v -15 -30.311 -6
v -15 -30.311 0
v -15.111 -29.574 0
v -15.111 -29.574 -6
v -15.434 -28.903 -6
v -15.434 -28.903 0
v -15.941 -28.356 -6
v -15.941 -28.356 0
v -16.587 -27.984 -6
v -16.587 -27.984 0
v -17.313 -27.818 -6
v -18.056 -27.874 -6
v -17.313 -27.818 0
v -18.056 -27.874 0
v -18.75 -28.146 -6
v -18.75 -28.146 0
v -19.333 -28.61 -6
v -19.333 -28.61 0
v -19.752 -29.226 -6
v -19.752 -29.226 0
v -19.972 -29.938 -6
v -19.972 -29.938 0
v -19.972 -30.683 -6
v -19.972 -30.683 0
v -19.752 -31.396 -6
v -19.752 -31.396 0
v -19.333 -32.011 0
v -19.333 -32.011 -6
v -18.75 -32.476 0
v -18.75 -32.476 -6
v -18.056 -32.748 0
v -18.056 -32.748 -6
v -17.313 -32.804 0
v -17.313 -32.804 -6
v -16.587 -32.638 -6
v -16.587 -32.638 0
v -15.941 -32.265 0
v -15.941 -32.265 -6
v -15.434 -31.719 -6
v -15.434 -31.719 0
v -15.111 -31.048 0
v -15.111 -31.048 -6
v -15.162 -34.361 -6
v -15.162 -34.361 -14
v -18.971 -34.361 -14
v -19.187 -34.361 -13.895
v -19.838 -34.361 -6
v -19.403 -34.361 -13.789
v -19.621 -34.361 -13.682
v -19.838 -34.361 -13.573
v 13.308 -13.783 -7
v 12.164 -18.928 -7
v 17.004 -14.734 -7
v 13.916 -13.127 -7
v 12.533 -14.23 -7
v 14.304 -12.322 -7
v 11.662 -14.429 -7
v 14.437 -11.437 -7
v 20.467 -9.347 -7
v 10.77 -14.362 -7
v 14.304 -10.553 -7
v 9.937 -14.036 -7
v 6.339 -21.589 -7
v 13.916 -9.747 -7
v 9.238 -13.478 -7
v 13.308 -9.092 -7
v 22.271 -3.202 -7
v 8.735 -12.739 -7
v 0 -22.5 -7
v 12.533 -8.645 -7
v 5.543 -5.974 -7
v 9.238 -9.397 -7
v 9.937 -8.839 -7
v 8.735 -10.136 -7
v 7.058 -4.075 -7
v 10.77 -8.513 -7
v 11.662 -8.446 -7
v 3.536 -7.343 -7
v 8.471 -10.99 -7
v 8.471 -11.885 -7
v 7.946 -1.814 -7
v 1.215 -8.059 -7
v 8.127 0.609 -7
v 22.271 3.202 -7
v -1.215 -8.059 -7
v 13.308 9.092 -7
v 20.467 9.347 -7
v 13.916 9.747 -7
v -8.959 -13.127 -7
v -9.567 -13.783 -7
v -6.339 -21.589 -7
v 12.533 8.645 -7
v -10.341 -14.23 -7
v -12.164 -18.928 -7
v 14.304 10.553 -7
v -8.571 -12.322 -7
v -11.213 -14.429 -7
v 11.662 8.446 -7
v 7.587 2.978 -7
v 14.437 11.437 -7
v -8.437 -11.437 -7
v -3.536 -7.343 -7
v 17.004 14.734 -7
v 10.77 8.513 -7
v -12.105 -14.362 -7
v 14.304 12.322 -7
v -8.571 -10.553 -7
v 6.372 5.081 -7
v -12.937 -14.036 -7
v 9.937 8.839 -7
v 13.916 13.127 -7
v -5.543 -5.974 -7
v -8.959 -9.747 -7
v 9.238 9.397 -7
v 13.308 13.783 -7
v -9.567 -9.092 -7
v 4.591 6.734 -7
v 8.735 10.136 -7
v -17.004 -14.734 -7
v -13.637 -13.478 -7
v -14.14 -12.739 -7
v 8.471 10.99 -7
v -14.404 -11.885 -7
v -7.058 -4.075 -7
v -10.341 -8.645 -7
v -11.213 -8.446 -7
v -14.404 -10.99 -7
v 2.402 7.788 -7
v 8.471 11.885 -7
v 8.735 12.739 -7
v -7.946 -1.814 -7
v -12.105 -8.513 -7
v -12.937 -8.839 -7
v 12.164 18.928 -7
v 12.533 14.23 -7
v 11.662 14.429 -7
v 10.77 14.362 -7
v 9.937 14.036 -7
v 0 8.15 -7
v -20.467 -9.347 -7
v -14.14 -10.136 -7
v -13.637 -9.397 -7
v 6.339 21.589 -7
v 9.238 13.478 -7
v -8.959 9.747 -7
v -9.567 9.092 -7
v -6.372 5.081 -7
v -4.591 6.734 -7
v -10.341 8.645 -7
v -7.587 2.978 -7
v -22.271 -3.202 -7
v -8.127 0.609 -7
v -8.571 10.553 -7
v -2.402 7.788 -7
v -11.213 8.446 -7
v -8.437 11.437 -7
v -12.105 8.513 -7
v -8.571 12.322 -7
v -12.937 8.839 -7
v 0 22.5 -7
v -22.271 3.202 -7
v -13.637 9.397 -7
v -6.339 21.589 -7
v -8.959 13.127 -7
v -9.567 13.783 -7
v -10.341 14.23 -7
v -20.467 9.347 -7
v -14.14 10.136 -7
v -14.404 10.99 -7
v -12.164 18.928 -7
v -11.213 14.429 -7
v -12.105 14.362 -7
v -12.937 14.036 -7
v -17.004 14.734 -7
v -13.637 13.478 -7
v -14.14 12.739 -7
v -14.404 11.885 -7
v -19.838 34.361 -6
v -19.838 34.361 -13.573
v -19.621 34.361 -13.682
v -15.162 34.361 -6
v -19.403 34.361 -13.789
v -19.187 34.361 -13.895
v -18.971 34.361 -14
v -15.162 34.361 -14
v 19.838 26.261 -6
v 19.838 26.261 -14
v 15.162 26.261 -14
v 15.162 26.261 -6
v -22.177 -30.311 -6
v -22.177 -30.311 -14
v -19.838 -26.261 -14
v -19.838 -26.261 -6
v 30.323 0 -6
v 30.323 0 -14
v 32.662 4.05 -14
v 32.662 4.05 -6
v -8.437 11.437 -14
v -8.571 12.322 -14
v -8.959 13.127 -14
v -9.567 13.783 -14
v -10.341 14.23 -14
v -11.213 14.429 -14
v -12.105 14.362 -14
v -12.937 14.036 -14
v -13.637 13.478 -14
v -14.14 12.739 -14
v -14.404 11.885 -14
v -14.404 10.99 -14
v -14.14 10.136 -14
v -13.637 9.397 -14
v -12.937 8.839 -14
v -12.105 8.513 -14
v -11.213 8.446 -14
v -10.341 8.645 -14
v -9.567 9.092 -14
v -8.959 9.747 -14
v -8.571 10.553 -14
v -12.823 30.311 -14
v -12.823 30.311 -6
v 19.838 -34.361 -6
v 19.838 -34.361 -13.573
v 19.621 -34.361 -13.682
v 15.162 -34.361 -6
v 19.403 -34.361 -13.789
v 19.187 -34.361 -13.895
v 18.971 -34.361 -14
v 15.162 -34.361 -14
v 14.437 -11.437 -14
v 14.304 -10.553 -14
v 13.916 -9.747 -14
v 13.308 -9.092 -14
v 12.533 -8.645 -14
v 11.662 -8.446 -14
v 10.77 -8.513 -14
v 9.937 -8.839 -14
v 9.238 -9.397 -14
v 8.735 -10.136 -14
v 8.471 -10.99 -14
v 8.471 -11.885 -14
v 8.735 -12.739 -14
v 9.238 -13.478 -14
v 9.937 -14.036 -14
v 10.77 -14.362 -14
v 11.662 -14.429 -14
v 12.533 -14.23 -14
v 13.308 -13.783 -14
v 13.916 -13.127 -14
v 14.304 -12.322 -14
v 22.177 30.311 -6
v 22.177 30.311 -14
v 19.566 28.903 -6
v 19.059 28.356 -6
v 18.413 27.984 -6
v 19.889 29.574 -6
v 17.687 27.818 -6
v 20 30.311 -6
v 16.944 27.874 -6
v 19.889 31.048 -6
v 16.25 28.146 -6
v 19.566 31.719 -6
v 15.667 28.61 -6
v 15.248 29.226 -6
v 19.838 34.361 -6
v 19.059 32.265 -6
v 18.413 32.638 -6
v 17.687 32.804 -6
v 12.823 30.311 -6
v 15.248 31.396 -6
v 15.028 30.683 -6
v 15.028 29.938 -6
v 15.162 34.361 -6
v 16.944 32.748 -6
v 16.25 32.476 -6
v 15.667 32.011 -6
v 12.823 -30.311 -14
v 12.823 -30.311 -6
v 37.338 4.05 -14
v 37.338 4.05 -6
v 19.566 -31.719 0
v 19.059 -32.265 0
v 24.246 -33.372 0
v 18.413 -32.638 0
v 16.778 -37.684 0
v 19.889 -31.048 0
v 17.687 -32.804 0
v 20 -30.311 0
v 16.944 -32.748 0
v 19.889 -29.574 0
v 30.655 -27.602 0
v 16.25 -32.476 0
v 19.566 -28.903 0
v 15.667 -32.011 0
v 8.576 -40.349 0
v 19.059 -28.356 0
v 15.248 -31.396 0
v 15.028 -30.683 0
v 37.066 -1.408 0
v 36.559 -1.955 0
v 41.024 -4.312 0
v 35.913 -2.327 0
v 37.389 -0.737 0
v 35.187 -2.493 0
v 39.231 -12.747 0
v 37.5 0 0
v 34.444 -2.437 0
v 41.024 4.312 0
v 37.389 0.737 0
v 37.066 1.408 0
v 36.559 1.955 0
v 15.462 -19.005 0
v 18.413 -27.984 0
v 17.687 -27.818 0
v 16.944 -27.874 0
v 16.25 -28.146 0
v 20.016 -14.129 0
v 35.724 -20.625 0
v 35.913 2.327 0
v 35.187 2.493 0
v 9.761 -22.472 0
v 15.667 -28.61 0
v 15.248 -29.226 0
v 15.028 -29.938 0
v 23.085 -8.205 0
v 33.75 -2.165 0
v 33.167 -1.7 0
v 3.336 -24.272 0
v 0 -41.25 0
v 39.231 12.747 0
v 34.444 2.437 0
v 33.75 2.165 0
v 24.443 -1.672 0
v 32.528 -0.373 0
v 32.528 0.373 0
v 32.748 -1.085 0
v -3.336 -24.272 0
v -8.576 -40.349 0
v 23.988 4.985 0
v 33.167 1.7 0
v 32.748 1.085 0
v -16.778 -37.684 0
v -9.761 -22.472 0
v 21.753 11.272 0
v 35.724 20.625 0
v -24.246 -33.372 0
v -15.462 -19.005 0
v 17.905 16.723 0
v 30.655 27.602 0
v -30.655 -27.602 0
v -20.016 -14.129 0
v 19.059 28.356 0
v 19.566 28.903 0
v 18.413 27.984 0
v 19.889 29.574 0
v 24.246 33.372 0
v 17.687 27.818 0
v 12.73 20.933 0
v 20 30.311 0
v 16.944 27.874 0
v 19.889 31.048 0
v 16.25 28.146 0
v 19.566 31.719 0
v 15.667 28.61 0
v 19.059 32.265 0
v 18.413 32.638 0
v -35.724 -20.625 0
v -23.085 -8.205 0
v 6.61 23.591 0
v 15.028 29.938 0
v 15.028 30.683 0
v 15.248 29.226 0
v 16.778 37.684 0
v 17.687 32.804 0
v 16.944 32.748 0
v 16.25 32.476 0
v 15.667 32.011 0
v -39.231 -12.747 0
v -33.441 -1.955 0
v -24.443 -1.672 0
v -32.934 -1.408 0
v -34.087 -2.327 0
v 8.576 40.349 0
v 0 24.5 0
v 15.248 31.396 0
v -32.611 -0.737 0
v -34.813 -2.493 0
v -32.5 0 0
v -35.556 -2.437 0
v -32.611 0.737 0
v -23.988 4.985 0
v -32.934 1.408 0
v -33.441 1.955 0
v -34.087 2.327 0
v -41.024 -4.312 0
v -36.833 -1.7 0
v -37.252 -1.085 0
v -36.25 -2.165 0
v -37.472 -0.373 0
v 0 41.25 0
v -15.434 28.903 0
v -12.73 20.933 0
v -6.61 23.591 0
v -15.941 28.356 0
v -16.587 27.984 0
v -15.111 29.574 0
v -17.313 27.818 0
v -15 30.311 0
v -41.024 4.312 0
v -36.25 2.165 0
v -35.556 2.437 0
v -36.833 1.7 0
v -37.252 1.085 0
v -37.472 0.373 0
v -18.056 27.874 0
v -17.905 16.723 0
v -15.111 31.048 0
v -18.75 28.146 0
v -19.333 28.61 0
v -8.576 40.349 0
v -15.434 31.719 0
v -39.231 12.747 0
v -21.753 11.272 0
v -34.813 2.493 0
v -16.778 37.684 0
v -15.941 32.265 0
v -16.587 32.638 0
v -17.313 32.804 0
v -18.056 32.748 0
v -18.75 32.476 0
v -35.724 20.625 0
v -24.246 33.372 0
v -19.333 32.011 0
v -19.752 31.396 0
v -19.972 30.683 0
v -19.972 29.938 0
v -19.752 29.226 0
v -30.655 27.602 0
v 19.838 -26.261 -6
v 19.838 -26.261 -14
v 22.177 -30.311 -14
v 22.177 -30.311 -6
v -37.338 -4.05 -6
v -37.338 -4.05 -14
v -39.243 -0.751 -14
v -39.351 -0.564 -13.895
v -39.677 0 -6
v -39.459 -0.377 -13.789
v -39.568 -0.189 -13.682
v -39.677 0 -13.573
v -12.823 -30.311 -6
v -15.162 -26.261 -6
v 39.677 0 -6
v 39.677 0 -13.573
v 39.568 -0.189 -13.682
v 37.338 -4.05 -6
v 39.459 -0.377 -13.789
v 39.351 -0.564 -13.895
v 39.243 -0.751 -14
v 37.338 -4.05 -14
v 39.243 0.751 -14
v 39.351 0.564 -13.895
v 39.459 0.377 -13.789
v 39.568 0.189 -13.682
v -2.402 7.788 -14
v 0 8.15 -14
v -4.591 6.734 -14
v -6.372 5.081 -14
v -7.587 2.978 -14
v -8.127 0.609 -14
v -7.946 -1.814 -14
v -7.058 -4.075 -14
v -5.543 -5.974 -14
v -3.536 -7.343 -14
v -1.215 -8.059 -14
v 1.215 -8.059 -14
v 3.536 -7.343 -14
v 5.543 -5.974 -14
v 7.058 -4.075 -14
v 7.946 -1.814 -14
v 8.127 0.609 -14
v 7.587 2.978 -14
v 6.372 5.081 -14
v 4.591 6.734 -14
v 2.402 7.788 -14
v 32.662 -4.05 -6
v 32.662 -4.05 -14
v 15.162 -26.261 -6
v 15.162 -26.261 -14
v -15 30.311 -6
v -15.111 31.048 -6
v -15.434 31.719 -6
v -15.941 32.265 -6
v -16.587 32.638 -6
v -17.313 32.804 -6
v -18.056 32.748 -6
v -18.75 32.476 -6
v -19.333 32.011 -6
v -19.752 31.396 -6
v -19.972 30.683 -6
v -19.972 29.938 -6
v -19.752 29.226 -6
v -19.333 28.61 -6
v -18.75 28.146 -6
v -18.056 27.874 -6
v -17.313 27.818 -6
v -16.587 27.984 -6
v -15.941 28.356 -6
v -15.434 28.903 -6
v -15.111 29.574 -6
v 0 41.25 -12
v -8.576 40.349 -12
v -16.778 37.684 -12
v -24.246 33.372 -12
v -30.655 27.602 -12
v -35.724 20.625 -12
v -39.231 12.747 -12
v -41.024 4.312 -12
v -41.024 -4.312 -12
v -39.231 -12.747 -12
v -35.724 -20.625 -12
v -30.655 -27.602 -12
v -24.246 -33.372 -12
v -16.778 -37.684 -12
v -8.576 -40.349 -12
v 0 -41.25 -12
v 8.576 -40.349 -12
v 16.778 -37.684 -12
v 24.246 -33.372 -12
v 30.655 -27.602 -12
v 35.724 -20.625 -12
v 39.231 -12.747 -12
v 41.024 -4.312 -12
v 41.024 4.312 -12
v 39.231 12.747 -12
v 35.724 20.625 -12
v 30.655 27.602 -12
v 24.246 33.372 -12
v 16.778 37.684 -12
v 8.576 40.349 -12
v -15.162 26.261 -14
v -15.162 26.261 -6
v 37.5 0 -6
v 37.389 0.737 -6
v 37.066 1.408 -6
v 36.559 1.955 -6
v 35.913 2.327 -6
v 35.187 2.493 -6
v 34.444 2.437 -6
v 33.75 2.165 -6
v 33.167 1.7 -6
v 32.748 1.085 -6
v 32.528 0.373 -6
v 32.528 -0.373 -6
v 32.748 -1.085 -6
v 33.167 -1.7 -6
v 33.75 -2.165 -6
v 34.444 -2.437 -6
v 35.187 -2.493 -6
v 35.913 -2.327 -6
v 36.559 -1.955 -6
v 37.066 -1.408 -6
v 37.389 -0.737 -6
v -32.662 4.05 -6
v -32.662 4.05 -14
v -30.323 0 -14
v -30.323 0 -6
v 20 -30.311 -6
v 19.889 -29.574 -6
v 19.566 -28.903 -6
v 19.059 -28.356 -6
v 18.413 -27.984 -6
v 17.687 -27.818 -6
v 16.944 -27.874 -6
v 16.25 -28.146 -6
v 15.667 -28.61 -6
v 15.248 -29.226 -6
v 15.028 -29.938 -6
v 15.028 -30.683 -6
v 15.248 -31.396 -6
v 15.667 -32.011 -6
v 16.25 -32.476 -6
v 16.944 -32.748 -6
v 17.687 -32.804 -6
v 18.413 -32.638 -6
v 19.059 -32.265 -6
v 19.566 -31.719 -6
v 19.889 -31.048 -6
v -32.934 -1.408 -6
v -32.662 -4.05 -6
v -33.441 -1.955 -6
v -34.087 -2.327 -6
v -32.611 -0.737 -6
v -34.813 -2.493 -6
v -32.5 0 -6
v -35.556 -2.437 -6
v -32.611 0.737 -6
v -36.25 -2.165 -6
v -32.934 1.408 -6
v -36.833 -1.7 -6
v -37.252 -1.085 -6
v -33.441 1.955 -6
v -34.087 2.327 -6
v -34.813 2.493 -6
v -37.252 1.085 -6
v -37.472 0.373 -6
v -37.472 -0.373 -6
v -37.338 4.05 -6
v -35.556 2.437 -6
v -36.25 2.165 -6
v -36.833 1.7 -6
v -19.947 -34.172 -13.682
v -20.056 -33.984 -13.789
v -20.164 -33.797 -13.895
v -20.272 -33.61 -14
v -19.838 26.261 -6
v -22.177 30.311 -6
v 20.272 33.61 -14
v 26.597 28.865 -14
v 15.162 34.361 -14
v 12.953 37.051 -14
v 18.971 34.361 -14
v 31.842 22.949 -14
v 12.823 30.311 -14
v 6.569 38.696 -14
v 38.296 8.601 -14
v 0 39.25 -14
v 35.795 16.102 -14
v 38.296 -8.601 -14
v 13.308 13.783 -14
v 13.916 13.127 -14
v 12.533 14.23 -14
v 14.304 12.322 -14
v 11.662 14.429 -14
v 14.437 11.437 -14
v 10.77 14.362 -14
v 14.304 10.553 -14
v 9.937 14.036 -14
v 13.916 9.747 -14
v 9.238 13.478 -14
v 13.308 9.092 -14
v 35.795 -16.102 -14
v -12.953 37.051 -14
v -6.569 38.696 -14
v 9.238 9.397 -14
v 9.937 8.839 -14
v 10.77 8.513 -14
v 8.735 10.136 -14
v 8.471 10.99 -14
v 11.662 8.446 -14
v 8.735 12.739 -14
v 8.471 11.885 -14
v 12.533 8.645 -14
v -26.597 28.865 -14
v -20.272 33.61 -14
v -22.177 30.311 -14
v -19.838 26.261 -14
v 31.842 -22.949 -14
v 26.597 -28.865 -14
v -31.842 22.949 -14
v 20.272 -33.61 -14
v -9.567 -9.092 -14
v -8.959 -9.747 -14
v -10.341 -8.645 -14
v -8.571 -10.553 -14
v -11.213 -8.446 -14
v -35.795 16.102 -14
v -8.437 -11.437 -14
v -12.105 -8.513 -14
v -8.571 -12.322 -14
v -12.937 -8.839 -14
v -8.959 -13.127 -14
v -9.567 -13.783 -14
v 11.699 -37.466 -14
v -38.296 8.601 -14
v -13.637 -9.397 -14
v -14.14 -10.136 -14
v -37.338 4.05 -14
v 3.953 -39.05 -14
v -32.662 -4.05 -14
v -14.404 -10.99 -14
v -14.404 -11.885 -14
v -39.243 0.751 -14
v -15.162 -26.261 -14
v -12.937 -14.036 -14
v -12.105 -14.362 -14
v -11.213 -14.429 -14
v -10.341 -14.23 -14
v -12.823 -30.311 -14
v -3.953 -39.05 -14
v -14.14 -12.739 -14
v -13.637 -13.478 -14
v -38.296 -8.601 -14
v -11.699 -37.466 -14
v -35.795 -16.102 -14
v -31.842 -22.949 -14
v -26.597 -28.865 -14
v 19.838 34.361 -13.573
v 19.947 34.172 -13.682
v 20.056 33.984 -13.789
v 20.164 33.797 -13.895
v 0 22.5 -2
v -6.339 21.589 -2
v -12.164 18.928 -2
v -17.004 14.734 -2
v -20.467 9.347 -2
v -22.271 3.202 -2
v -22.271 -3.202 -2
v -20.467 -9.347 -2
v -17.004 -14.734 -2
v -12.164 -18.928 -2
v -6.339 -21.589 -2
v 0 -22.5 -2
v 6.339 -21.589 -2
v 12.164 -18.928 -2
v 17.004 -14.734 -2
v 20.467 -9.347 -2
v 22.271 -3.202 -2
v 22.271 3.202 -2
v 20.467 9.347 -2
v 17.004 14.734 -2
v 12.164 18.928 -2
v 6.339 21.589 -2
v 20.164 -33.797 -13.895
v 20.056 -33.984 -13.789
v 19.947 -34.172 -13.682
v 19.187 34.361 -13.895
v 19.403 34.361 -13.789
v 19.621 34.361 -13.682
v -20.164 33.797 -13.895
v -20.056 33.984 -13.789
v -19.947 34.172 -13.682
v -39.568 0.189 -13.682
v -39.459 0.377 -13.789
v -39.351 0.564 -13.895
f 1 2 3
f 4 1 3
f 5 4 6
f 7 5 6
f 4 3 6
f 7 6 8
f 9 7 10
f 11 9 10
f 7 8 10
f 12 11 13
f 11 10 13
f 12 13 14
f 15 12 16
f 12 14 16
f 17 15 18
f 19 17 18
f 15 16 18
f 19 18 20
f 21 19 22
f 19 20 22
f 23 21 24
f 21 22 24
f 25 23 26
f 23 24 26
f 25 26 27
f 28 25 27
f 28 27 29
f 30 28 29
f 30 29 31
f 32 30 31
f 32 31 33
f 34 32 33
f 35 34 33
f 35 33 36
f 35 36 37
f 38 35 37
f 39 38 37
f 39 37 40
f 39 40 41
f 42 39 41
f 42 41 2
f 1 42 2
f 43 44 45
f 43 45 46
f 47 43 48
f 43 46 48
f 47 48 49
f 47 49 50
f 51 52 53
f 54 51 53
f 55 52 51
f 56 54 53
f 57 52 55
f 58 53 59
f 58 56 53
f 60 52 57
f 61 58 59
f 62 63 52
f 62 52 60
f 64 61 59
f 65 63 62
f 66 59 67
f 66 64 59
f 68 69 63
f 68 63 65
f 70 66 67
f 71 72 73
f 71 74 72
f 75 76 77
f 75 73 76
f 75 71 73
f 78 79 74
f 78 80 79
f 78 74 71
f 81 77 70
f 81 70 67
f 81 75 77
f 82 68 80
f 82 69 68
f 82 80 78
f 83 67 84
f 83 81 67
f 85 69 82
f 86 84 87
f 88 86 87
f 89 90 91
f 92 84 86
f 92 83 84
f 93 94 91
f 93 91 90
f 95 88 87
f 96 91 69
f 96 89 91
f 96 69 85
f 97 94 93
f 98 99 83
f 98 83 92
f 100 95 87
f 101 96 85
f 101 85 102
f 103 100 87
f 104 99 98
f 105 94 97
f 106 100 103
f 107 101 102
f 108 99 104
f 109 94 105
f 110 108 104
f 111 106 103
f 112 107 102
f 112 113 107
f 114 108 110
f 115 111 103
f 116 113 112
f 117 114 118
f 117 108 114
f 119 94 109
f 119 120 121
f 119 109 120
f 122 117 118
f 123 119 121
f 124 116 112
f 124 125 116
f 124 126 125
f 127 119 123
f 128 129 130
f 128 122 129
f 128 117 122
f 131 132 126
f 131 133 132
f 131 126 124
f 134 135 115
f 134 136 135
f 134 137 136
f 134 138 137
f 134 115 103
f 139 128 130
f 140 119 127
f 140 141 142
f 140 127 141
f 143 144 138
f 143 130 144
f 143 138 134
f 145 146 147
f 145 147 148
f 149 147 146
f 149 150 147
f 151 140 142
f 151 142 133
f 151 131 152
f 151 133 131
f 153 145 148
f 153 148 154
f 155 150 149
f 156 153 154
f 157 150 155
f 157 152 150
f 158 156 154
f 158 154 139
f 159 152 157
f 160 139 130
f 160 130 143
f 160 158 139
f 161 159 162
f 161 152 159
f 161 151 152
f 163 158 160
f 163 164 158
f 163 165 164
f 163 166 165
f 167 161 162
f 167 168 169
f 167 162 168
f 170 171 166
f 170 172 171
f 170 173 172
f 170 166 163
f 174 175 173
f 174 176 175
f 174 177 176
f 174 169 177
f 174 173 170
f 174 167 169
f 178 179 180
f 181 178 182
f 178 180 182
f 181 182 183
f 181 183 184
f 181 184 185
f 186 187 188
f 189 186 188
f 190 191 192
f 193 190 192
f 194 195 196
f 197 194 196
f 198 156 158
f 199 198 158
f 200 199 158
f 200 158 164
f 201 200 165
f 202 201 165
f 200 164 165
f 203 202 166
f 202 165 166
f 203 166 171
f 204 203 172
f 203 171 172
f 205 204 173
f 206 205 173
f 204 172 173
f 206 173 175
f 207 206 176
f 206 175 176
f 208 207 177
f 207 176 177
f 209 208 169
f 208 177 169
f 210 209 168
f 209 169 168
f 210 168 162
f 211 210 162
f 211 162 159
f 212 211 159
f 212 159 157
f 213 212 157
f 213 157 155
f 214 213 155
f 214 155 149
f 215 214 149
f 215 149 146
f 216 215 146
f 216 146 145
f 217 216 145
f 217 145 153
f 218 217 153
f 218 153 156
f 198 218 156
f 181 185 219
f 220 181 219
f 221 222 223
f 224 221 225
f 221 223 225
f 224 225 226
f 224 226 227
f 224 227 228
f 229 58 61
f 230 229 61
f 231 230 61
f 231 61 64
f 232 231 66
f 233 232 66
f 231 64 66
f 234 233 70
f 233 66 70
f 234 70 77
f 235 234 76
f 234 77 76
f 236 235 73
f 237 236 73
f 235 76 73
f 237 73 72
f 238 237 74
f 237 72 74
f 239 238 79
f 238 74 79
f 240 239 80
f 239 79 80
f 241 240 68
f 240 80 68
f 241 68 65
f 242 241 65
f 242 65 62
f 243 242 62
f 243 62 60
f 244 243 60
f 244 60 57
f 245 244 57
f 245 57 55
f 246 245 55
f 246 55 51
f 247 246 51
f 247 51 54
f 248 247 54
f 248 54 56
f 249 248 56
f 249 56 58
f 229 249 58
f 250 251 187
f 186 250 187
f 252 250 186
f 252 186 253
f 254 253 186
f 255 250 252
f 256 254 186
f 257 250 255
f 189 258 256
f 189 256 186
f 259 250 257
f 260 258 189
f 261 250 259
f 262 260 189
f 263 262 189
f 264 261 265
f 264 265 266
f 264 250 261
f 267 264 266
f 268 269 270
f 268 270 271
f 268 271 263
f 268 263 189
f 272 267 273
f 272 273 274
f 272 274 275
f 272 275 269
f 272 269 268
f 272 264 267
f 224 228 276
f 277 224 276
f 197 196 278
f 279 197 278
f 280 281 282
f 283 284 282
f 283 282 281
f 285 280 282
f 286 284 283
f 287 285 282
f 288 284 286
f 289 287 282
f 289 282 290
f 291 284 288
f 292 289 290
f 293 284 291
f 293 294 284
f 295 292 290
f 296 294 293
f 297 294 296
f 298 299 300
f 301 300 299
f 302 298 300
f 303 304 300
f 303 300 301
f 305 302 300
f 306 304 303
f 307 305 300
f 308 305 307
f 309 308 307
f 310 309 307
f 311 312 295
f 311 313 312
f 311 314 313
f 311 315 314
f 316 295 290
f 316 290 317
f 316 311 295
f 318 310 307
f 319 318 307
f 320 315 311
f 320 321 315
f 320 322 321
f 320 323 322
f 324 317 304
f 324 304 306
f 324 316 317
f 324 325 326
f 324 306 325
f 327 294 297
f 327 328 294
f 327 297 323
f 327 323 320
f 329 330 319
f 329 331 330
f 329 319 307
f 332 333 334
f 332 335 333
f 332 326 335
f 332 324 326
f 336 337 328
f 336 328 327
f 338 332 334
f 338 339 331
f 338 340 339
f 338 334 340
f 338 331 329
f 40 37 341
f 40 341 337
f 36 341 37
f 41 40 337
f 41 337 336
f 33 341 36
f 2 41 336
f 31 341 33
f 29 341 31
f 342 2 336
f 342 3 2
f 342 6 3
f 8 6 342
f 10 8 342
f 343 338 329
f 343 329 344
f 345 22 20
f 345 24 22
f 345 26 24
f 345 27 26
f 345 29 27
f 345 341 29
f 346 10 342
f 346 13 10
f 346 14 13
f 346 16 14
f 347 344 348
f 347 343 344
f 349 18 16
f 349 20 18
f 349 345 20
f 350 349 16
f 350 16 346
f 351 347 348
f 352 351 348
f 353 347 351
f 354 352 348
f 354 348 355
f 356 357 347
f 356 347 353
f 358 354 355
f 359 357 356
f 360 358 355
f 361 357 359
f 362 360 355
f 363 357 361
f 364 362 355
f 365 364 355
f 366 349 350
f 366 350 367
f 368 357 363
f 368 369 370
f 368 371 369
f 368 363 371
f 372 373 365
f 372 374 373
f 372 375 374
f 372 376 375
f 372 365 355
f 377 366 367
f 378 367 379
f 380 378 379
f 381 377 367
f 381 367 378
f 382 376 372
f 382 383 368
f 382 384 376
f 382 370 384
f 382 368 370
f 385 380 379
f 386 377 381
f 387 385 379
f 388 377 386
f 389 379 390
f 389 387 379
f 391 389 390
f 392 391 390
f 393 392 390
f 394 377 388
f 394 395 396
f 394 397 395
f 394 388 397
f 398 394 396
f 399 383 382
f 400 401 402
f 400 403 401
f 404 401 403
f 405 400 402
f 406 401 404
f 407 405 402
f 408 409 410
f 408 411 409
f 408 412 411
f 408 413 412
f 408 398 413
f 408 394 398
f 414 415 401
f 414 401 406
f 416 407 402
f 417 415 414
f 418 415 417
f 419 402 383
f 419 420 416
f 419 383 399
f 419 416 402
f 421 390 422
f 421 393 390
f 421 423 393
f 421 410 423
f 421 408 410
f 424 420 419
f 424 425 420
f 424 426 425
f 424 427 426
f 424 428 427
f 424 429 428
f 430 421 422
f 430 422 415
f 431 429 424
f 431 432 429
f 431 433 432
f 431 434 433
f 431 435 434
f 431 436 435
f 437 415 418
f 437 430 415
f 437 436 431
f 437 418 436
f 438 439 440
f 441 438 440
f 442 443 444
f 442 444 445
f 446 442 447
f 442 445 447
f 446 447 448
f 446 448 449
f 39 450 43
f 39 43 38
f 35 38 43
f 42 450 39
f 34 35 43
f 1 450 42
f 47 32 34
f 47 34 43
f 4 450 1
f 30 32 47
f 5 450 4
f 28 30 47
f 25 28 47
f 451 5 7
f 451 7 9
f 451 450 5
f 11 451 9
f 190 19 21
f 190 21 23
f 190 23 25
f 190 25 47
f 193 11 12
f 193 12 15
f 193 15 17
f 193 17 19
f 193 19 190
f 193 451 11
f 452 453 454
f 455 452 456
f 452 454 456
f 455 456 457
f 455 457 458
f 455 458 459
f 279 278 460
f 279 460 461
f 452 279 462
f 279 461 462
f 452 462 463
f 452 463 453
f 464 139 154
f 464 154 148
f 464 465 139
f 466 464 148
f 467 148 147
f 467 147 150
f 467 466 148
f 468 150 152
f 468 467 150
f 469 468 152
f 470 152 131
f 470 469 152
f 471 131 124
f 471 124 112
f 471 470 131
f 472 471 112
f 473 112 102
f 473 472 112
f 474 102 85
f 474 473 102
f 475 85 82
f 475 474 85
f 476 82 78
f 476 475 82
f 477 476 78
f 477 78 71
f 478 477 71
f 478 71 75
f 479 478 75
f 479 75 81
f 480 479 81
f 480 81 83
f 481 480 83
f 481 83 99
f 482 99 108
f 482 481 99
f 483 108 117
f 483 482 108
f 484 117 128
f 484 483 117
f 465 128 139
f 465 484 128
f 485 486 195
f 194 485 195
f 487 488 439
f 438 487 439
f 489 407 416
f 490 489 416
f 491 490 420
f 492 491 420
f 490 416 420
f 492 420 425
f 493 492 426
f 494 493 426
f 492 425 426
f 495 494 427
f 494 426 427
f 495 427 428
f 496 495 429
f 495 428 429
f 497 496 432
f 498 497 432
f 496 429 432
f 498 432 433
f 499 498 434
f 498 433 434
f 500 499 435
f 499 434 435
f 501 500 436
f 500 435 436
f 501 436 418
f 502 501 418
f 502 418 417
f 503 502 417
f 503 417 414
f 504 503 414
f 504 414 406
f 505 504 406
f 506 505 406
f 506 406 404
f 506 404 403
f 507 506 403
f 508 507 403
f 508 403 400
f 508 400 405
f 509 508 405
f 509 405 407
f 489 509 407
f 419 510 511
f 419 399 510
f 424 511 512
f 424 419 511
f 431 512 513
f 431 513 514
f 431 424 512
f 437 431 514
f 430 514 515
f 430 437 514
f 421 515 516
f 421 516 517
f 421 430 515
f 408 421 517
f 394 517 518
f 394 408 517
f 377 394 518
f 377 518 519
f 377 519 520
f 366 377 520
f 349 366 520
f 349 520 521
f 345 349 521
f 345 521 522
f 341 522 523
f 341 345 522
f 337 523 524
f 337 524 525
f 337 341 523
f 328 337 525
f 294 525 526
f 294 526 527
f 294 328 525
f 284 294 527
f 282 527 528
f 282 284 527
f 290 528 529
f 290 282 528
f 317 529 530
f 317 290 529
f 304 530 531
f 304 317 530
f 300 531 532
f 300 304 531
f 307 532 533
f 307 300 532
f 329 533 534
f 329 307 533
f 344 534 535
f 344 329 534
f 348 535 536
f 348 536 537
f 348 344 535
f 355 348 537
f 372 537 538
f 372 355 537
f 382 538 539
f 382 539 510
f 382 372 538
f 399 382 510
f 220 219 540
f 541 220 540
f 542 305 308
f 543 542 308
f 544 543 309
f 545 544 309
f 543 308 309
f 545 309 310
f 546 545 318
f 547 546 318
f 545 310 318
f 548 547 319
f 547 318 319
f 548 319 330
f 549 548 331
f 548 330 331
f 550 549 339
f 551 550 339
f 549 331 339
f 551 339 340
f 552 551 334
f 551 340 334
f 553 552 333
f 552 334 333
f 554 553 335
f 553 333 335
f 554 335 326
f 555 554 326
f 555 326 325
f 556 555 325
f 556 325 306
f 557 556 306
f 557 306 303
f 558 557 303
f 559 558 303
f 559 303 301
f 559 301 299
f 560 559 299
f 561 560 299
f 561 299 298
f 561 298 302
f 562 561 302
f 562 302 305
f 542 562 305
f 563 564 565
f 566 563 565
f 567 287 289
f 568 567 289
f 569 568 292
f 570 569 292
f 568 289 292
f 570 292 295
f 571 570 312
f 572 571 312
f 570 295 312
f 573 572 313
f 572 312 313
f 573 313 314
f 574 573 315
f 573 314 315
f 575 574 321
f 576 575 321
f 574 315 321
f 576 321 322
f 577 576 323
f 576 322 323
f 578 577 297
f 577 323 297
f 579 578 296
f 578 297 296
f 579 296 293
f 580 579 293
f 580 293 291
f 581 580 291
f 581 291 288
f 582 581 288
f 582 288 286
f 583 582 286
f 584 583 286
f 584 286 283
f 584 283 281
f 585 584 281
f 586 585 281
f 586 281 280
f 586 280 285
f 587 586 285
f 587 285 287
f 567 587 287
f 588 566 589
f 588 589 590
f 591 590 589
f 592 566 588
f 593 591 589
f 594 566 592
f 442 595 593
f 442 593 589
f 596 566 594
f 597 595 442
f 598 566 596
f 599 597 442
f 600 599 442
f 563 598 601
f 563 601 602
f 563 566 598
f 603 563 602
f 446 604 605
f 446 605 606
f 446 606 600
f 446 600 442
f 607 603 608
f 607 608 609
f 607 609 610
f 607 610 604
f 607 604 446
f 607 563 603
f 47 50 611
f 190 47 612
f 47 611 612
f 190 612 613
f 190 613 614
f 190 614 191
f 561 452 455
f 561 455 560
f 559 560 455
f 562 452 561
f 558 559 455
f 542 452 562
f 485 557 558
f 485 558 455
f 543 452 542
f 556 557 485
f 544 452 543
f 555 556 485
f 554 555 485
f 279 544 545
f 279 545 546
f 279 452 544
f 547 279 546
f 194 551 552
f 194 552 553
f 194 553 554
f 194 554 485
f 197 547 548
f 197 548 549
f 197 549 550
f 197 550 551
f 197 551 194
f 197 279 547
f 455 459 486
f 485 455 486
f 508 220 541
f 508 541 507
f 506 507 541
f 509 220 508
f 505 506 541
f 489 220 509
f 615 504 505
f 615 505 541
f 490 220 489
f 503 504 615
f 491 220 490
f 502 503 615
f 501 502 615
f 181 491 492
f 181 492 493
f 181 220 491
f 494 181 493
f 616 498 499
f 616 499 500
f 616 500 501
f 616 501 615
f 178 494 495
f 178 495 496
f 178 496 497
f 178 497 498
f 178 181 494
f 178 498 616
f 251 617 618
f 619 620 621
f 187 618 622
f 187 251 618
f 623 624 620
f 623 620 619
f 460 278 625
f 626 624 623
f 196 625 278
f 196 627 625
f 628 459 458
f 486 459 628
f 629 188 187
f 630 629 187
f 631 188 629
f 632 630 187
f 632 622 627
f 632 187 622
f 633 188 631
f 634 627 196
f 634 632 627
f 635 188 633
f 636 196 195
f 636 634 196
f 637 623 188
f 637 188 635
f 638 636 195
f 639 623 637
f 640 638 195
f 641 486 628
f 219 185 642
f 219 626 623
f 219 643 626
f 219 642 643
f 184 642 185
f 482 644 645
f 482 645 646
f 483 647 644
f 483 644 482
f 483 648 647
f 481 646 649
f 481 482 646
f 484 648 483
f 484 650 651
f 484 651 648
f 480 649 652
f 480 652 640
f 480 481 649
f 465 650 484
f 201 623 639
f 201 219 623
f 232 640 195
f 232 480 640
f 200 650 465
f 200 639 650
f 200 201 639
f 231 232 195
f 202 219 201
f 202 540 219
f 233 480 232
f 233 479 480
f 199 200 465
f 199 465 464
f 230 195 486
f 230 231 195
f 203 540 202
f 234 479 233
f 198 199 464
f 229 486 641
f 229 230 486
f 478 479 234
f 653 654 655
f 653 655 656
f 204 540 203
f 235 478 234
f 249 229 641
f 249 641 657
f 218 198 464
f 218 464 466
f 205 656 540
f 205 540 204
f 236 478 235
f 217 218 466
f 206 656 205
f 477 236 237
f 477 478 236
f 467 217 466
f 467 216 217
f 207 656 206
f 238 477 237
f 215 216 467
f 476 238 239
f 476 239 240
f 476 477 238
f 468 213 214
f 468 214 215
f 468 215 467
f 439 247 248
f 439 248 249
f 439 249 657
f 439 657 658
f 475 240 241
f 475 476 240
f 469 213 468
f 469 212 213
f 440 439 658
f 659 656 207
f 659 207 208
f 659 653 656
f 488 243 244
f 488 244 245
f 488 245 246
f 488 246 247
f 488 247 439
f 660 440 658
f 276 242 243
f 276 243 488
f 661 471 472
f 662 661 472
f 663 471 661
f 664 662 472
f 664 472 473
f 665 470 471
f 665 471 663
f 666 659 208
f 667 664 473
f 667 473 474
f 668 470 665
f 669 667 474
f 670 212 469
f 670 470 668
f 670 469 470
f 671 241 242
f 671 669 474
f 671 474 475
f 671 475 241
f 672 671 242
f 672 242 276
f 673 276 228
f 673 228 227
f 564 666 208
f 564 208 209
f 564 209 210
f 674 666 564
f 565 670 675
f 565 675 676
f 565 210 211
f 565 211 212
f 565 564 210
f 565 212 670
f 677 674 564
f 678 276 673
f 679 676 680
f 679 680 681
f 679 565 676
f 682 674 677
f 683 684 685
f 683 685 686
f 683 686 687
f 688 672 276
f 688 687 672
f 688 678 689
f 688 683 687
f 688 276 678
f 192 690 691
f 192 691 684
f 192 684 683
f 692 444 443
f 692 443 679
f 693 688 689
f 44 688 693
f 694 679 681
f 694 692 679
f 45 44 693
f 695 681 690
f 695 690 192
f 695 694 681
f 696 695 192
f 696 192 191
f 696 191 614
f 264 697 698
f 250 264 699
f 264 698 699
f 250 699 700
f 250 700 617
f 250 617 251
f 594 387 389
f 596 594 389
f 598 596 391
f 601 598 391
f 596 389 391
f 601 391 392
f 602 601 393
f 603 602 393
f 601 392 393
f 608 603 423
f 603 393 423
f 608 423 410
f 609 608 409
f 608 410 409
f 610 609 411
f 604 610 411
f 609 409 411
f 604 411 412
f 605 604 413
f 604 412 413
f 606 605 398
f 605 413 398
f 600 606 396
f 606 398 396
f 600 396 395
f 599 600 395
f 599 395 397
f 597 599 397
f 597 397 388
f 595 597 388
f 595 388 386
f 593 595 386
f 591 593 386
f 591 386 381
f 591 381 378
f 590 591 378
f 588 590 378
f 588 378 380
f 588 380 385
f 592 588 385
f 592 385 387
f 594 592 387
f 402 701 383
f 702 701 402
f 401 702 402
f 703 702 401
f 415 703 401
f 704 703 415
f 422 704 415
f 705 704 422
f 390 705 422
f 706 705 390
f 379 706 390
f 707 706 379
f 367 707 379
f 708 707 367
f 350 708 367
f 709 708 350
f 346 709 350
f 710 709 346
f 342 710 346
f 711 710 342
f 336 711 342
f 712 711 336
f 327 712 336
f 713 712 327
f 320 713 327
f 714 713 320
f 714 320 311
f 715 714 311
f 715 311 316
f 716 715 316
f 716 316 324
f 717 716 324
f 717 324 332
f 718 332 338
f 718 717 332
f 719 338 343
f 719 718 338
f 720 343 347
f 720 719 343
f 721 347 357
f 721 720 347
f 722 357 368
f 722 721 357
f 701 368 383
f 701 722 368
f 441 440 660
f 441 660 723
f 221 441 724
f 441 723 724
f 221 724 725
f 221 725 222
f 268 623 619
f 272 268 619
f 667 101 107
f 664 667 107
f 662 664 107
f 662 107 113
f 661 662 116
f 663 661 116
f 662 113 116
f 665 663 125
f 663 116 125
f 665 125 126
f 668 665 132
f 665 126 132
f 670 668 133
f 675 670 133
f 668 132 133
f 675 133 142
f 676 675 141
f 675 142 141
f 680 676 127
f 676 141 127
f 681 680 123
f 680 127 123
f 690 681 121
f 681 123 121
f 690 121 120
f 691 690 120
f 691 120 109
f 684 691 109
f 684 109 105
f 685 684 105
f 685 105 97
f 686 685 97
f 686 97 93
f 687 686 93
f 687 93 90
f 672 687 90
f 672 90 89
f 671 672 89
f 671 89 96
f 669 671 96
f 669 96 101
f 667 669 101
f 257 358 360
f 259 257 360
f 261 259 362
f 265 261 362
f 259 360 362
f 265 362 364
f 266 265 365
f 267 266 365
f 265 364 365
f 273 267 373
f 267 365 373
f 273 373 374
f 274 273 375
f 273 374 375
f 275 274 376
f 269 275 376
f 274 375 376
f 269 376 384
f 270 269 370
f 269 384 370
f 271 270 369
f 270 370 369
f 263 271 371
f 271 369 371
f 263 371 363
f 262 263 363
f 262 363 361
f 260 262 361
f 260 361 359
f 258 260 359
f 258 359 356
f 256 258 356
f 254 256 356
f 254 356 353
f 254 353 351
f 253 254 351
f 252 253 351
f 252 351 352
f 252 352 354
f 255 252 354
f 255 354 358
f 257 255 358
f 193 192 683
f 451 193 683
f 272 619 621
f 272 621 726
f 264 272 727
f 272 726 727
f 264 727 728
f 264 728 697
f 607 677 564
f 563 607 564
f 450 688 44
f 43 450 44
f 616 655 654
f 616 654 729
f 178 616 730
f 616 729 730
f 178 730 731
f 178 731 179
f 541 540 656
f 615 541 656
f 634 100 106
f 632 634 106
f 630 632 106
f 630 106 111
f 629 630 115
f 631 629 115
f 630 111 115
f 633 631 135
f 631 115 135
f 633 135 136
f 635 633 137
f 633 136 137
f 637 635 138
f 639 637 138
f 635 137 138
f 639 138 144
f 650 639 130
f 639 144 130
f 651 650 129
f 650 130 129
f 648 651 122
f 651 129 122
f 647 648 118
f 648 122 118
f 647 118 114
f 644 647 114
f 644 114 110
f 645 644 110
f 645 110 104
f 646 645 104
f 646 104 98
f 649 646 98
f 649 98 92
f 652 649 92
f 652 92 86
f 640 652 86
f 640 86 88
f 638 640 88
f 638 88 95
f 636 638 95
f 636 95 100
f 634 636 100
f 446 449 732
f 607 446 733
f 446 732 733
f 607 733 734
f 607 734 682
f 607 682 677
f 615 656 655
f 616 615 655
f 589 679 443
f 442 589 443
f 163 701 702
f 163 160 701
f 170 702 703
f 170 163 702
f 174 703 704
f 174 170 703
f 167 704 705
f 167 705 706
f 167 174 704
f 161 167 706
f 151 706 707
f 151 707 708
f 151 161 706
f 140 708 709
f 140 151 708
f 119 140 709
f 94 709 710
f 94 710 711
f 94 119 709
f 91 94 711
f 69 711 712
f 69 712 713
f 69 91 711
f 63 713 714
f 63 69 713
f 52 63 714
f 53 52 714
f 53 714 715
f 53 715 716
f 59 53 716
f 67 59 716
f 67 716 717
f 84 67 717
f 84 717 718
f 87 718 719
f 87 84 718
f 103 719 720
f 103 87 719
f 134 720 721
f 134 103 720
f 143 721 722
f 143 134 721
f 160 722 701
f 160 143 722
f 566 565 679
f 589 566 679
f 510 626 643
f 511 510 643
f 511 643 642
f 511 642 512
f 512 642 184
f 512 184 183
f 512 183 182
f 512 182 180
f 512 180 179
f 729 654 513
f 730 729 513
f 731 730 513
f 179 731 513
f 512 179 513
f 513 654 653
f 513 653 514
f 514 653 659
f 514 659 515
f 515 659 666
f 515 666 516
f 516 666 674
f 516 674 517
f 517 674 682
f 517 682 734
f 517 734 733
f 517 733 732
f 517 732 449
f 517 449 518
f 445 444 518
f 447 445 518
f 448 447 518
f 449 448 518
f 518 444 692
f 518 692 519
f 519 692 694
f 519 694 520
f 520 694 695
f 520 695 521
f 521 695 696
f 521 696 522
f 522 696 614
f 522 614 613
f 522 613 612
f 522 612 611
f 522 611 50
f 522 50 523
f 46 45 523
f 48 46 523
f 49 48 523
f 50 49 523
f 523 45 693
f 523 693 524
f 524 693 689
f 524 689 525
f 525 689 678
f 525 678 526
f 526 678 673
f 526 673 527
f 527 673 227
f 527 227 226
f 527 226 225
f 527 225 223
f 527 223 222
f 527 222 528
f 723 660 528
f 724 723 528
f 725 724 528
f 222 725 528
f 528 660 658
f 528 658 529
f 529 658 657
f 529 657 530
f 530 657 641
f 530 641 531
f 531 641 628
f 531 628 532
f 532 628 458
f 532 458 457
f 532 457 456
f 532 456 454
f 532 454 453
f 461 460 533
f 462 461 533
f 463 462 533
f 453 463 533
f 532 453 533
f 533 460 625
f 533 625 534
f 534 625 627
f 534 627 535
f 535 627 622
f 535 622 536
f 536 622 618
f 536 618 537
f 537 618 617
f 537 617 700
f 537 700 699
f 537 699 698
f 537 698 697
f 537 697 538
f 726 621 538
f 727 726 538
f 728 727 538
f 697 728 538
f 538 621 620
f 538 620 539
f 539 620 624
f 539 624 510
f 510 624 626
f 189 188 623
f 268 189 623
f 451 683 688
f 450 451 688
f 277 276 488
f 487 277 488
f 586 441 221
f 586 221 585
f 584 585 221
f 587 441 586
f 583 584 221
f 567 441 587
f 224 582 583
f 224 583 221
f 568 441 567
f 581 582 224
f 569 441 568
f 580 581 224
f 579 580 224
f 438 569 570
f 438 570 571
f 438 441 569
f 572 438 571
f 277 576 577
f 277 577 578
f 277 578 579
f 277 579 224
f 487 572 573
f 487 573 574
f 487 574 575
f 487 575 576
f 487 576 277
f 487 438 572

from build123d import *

# Parameters (mm, degrees)
SKETCH_2_R          = 2.5
SKETCH_2_R_2        = 3
CUT_EXTRUDE_1_DEPTH = 60.99270789
CUT_EXTRUDE_2_DEPTH = 8
CHAMFER_1_SIZE      = 2


with BuildPart() as part:
    # 草图1 → 旋转1 (revolve)
    with BuildSketch(Plane(origin=(0, 0, 0), x_dir=(0, 0, -1), z_dir=(1, 0, 0))):
        Polygon((0, 41.25), (0, 22.5), (7, 22.5), (7, 8.15), (14, 8.15), (14, 41.25), align=None)
    revolve(axis=Axis((0, 0, -14), (0, 0, 1)))

    # 草图2 → 切除-拉伸1 (cut, through all)
    with BuildSketch(Plane.XY):
        with Locations((-17.5, 30.310889132)):
            Circle(SKETCH_2_R)
        with Locations((17.5, 30.310889132)):
            Circle(SKETCH_2_R)
        with Locations((35, 0)):
            Circle(SKETCH_2_R)
        with Locations((17.5, -30.310889132)):
            Circle(SKETCH_2_R)
        with Locations((-17.5, -30.310889132)):
            Circle(SKETCH_2_R)
        with Locations((-35, 0)):
            Circle(SKETCH_2_R)
        with Locations((-11.437452186, 11.437452186)):
            Circle(SKETCH_2_R_2)
        with Locations((11.437452186, 11.437452186)):
            Circle(SKETCH_2_R_2)
        with Locations((11.437452186, -11.437452186)):
            Circle(SKETCH_2_R_2)
        with Locations((-11.437452186, -11.437452186)):
            Circle(SKETCH_2_R_2)
    extrude(amount=-CUT_EXTRUDE_1_DEPTH, mode=Mode.SUBTRACT)

    # 草图3 → 切除-拉伸2 (cut)
    with BuildSketch(Plane(origin=(0, 0, -14), x_dir=(-1, 0, 0), z_dir=(0, 0, -1))):
        Polygon((-12.82346282, 30.310889132), (-15.16173141, 34.360889132), (-19.83826859, 34.360889132), (-22.17653718, 30.310889132), (-19.83826859, 26.260889132), (-15.16173141, 26.260889132), align=None)
        Polygon((19.83826859, 26.260889132), (22.17653718, 30.310889132), (19.83826859, 34.360889132), (15.16173141, 34.360889132), (12.82346282, 30.310889132), (15.16173141, 26.260889132), align=None)
        Polygon((32.66173141, -4.05), (37.33826859, -4.05), (39.67653718, 0), (37.33826859, 4.05), (32.66173141, 4.05), (30.32346282, 0), align=None)
        Polygon((19.83826859, -26.260889132), (15.16173141, -26.260889132), (12.82346282, -30.310889132), (15.16173141, -34.360889132), (19.83826859, -34.360889132), (22.17653718, -30.310889132), align=None)
        Polygon((-15.16173141, -26.260889132), (-19.83826859, -26.260889132), (-22.17653718, -30.310889132), (-19.83826859, -34.360889132), (-15.16173141, -34.360889132), (-12.82346282, -30.310889132), align=None)
        Polygon((-32.66173141, 4.05), (-37.33826859, 4.05), (-39.67653718, 0), (-37.33826859, -4.05), (-32.66173141, -4.05), (-30.32346282, 0), align=None)
    extrude(amount=-CUT_EXTRUDE_2_DEPTH, mode=Mode.SUBTRACT)

    # 倒角1
    # the kernel refuses this chamfer: 2 mm, written as the material it takes off along each edge
    with BuildSketch(Plane(origin=(0, 0, -14), x_dir=(0, 1, 0), z_dir=(1, 0, 0))) as chamfer_1_piece_1:
        Polygon((41.25, CHAMFER_1_SIZE), (41.25 - CHAMFER_1_SIZE, 0), (41.25, 0), align=None)
    revolve(axis=Axis((0, 0, -14), (0, 0, 1)), mode=Mode.SUBTRACT)
    with BuildSketch(Plane(origin=(0, 0, 0), x_dir=(0, 1, 0), z_dir=(1, 0, 0))) as chamfer_1_piece_2:
        Polygon((22.5 + CHAMFER_1_SIZE, 0), (22.5, -CHAMFER_1_SIZE), (22.5, 0), align=None)
    revolve(axis=Axis((0, 0, 0), (0, 0, 1)), mode=Mode.SUBTRACT)


solid = part.part
